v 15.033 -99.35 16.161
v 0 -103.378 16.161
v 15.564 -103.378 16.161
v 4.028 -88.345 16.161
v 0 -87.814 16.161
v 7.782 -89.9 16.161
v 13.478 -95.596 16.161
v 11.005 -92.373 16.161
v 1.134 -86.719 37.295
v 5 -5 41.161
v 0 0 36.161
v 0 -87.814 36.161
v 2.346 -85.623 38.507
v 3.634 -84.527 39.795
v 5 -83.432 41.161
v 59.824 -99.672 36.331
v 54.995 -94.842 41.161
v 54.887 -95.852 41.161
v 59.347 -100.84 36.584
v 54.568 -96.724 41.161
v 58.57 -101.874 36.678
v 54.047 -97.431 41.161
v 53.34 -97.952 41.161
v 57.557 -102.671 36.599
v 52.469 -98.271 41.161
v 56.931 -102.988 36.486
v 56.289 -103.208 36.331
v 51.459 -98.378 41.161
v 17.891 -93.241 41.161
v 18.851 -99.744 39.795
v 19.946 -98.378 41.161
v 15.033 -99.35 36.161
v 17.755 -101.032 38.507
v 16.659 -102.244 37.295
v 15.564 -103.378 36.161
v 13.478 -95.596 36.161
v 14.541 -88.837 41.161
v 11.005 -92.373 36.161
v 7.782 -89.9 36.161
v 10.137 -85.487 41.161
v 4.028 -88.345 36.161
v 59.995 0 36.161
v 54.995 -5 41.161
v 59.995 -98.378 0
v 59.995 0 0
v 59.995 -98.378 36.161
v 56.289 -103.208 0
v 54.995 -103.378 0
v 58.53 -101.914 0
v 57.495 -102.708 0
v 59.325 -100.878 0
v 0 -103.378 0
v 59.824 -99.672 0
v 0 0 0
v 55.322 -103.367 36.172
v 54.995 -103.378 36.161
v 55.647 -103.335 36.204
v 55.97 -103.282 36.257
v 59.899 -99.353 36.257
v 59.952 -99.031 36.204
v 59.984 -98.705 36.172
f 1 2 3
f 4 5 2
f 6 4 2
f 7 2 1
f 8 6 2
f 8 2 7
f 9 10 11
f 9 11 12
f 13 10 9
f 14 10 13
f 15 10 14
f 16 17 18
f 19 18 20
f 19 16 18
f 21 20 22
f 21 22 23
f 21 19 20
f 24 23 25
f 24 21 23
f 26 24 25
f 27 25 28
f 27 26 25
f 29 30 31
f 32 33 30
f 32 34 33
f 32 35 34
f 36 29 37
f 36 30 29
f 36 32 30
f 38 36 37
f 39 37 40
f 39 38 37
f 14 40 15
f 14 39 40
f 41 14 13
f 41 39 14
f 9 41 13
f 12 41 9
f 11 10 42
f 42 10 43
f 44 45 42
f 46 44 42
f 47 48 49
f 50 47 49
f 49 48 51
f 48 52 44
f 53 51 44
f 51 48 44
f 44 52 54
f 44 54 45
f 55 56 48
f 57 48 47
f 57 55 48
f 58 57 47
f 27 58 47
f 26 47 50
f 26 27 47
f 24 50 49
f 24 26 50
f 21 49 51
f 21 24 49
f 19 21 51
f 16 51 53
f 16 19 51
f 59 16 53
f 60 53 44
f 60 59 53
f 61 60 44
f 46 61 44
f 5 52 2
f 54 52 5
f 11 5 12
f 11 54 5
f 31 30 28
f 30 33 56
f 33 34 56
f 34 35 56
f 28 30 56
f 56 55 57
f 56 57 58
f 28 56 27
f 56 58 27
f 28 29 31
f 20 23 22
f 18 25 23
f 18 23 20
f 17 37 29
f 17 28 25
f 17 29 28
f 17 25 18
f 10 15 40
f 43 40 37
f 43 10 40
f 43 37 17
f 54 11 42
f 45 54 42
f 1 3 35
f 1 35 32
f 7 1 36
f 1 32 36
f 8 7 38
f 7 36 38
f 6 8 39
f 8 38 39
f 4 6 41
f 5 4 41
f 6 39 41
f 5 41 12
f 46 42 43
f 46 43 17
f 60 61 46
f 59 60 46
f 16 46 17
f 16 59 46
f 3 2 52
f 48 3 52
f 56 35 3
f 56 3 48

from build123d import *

# Parameters (mm, degrees)
F0_W     = 59.9947497249
F0_H     = 41.1609634757
F1_DEPTH = 103.378
F3_DEPTH = 25
F4_SIZE  = 5
F5_F1_R  = 5
F5_F2_R  = 5


with BuildPart() as f1:
    # F0 (on Front) → F1 (new body)
    with BuildSketch(Plane.XZ):
        with Locations((29.9973748624, 20.5804817379)):
            Rectangle(F0_W, F0_H)
    extrude(amount=F1_DEPTH)

    # F2 (on face) → F3 (cut)
    with BuildSketch(Plane.XY.offset(41.1609634757)):
        with BuildLine():
            ThreePointArc((0, -87.8144259489), (-11.005108751, -114.383108751), (15.5635740511, -103.378))
            Line((15.5635740511, -103.378), (0, -103.378))
            Line((0, -103.378), (0, -87.8144259489))
        make_face()
        with BuildLine():
            Line((0, -103.378), (15.5635740511, -103.378))
            ThreePointArc((15.5635740511, -103.378), (11.005108751, -92.372891249), (0, -87.8144259489))
            Line((0, -87.8144259489), (0, -103.378))
        make_face()
    extrude(amount=-F3_DEPTH, mode=Mode.SUBTRACT)

    # F4
    f4_edges = [f1.edges().sort_by_distance(p)[0] for p in [
        (29.997375, 0, 41.160963),
        (0, -43.907213, 41.160963),
        (11.005109, -92.372891, 41.160963),
        (37.779162, -103.378, 41.160963),
        (59.99475, -51.689, 41.160963),
    ]]
    chamfer(f4_edges, length=F4_SIZE)

    # F5: fillet of radius 5 on 2 edges, made by hand

    # F5_f1
    f5_f1_edges = [f1.edges().sort_by_distance(p)[0] for p in [
        (59.9947497249, -103.378, 18.0804817379),
    ]]
    fillet(f5_f1_edges, radius=F5_F1_R)

    # F5_f2
    f5_f2_edges = [f1.edges().sort_by_distance(p)[0] for p in [
        (56.7625166778, -100.145766953, 39.3931965227),
    ]]
    fillet(f5_f2_edges, radius=F5_F2_R)


solid = f1.part
